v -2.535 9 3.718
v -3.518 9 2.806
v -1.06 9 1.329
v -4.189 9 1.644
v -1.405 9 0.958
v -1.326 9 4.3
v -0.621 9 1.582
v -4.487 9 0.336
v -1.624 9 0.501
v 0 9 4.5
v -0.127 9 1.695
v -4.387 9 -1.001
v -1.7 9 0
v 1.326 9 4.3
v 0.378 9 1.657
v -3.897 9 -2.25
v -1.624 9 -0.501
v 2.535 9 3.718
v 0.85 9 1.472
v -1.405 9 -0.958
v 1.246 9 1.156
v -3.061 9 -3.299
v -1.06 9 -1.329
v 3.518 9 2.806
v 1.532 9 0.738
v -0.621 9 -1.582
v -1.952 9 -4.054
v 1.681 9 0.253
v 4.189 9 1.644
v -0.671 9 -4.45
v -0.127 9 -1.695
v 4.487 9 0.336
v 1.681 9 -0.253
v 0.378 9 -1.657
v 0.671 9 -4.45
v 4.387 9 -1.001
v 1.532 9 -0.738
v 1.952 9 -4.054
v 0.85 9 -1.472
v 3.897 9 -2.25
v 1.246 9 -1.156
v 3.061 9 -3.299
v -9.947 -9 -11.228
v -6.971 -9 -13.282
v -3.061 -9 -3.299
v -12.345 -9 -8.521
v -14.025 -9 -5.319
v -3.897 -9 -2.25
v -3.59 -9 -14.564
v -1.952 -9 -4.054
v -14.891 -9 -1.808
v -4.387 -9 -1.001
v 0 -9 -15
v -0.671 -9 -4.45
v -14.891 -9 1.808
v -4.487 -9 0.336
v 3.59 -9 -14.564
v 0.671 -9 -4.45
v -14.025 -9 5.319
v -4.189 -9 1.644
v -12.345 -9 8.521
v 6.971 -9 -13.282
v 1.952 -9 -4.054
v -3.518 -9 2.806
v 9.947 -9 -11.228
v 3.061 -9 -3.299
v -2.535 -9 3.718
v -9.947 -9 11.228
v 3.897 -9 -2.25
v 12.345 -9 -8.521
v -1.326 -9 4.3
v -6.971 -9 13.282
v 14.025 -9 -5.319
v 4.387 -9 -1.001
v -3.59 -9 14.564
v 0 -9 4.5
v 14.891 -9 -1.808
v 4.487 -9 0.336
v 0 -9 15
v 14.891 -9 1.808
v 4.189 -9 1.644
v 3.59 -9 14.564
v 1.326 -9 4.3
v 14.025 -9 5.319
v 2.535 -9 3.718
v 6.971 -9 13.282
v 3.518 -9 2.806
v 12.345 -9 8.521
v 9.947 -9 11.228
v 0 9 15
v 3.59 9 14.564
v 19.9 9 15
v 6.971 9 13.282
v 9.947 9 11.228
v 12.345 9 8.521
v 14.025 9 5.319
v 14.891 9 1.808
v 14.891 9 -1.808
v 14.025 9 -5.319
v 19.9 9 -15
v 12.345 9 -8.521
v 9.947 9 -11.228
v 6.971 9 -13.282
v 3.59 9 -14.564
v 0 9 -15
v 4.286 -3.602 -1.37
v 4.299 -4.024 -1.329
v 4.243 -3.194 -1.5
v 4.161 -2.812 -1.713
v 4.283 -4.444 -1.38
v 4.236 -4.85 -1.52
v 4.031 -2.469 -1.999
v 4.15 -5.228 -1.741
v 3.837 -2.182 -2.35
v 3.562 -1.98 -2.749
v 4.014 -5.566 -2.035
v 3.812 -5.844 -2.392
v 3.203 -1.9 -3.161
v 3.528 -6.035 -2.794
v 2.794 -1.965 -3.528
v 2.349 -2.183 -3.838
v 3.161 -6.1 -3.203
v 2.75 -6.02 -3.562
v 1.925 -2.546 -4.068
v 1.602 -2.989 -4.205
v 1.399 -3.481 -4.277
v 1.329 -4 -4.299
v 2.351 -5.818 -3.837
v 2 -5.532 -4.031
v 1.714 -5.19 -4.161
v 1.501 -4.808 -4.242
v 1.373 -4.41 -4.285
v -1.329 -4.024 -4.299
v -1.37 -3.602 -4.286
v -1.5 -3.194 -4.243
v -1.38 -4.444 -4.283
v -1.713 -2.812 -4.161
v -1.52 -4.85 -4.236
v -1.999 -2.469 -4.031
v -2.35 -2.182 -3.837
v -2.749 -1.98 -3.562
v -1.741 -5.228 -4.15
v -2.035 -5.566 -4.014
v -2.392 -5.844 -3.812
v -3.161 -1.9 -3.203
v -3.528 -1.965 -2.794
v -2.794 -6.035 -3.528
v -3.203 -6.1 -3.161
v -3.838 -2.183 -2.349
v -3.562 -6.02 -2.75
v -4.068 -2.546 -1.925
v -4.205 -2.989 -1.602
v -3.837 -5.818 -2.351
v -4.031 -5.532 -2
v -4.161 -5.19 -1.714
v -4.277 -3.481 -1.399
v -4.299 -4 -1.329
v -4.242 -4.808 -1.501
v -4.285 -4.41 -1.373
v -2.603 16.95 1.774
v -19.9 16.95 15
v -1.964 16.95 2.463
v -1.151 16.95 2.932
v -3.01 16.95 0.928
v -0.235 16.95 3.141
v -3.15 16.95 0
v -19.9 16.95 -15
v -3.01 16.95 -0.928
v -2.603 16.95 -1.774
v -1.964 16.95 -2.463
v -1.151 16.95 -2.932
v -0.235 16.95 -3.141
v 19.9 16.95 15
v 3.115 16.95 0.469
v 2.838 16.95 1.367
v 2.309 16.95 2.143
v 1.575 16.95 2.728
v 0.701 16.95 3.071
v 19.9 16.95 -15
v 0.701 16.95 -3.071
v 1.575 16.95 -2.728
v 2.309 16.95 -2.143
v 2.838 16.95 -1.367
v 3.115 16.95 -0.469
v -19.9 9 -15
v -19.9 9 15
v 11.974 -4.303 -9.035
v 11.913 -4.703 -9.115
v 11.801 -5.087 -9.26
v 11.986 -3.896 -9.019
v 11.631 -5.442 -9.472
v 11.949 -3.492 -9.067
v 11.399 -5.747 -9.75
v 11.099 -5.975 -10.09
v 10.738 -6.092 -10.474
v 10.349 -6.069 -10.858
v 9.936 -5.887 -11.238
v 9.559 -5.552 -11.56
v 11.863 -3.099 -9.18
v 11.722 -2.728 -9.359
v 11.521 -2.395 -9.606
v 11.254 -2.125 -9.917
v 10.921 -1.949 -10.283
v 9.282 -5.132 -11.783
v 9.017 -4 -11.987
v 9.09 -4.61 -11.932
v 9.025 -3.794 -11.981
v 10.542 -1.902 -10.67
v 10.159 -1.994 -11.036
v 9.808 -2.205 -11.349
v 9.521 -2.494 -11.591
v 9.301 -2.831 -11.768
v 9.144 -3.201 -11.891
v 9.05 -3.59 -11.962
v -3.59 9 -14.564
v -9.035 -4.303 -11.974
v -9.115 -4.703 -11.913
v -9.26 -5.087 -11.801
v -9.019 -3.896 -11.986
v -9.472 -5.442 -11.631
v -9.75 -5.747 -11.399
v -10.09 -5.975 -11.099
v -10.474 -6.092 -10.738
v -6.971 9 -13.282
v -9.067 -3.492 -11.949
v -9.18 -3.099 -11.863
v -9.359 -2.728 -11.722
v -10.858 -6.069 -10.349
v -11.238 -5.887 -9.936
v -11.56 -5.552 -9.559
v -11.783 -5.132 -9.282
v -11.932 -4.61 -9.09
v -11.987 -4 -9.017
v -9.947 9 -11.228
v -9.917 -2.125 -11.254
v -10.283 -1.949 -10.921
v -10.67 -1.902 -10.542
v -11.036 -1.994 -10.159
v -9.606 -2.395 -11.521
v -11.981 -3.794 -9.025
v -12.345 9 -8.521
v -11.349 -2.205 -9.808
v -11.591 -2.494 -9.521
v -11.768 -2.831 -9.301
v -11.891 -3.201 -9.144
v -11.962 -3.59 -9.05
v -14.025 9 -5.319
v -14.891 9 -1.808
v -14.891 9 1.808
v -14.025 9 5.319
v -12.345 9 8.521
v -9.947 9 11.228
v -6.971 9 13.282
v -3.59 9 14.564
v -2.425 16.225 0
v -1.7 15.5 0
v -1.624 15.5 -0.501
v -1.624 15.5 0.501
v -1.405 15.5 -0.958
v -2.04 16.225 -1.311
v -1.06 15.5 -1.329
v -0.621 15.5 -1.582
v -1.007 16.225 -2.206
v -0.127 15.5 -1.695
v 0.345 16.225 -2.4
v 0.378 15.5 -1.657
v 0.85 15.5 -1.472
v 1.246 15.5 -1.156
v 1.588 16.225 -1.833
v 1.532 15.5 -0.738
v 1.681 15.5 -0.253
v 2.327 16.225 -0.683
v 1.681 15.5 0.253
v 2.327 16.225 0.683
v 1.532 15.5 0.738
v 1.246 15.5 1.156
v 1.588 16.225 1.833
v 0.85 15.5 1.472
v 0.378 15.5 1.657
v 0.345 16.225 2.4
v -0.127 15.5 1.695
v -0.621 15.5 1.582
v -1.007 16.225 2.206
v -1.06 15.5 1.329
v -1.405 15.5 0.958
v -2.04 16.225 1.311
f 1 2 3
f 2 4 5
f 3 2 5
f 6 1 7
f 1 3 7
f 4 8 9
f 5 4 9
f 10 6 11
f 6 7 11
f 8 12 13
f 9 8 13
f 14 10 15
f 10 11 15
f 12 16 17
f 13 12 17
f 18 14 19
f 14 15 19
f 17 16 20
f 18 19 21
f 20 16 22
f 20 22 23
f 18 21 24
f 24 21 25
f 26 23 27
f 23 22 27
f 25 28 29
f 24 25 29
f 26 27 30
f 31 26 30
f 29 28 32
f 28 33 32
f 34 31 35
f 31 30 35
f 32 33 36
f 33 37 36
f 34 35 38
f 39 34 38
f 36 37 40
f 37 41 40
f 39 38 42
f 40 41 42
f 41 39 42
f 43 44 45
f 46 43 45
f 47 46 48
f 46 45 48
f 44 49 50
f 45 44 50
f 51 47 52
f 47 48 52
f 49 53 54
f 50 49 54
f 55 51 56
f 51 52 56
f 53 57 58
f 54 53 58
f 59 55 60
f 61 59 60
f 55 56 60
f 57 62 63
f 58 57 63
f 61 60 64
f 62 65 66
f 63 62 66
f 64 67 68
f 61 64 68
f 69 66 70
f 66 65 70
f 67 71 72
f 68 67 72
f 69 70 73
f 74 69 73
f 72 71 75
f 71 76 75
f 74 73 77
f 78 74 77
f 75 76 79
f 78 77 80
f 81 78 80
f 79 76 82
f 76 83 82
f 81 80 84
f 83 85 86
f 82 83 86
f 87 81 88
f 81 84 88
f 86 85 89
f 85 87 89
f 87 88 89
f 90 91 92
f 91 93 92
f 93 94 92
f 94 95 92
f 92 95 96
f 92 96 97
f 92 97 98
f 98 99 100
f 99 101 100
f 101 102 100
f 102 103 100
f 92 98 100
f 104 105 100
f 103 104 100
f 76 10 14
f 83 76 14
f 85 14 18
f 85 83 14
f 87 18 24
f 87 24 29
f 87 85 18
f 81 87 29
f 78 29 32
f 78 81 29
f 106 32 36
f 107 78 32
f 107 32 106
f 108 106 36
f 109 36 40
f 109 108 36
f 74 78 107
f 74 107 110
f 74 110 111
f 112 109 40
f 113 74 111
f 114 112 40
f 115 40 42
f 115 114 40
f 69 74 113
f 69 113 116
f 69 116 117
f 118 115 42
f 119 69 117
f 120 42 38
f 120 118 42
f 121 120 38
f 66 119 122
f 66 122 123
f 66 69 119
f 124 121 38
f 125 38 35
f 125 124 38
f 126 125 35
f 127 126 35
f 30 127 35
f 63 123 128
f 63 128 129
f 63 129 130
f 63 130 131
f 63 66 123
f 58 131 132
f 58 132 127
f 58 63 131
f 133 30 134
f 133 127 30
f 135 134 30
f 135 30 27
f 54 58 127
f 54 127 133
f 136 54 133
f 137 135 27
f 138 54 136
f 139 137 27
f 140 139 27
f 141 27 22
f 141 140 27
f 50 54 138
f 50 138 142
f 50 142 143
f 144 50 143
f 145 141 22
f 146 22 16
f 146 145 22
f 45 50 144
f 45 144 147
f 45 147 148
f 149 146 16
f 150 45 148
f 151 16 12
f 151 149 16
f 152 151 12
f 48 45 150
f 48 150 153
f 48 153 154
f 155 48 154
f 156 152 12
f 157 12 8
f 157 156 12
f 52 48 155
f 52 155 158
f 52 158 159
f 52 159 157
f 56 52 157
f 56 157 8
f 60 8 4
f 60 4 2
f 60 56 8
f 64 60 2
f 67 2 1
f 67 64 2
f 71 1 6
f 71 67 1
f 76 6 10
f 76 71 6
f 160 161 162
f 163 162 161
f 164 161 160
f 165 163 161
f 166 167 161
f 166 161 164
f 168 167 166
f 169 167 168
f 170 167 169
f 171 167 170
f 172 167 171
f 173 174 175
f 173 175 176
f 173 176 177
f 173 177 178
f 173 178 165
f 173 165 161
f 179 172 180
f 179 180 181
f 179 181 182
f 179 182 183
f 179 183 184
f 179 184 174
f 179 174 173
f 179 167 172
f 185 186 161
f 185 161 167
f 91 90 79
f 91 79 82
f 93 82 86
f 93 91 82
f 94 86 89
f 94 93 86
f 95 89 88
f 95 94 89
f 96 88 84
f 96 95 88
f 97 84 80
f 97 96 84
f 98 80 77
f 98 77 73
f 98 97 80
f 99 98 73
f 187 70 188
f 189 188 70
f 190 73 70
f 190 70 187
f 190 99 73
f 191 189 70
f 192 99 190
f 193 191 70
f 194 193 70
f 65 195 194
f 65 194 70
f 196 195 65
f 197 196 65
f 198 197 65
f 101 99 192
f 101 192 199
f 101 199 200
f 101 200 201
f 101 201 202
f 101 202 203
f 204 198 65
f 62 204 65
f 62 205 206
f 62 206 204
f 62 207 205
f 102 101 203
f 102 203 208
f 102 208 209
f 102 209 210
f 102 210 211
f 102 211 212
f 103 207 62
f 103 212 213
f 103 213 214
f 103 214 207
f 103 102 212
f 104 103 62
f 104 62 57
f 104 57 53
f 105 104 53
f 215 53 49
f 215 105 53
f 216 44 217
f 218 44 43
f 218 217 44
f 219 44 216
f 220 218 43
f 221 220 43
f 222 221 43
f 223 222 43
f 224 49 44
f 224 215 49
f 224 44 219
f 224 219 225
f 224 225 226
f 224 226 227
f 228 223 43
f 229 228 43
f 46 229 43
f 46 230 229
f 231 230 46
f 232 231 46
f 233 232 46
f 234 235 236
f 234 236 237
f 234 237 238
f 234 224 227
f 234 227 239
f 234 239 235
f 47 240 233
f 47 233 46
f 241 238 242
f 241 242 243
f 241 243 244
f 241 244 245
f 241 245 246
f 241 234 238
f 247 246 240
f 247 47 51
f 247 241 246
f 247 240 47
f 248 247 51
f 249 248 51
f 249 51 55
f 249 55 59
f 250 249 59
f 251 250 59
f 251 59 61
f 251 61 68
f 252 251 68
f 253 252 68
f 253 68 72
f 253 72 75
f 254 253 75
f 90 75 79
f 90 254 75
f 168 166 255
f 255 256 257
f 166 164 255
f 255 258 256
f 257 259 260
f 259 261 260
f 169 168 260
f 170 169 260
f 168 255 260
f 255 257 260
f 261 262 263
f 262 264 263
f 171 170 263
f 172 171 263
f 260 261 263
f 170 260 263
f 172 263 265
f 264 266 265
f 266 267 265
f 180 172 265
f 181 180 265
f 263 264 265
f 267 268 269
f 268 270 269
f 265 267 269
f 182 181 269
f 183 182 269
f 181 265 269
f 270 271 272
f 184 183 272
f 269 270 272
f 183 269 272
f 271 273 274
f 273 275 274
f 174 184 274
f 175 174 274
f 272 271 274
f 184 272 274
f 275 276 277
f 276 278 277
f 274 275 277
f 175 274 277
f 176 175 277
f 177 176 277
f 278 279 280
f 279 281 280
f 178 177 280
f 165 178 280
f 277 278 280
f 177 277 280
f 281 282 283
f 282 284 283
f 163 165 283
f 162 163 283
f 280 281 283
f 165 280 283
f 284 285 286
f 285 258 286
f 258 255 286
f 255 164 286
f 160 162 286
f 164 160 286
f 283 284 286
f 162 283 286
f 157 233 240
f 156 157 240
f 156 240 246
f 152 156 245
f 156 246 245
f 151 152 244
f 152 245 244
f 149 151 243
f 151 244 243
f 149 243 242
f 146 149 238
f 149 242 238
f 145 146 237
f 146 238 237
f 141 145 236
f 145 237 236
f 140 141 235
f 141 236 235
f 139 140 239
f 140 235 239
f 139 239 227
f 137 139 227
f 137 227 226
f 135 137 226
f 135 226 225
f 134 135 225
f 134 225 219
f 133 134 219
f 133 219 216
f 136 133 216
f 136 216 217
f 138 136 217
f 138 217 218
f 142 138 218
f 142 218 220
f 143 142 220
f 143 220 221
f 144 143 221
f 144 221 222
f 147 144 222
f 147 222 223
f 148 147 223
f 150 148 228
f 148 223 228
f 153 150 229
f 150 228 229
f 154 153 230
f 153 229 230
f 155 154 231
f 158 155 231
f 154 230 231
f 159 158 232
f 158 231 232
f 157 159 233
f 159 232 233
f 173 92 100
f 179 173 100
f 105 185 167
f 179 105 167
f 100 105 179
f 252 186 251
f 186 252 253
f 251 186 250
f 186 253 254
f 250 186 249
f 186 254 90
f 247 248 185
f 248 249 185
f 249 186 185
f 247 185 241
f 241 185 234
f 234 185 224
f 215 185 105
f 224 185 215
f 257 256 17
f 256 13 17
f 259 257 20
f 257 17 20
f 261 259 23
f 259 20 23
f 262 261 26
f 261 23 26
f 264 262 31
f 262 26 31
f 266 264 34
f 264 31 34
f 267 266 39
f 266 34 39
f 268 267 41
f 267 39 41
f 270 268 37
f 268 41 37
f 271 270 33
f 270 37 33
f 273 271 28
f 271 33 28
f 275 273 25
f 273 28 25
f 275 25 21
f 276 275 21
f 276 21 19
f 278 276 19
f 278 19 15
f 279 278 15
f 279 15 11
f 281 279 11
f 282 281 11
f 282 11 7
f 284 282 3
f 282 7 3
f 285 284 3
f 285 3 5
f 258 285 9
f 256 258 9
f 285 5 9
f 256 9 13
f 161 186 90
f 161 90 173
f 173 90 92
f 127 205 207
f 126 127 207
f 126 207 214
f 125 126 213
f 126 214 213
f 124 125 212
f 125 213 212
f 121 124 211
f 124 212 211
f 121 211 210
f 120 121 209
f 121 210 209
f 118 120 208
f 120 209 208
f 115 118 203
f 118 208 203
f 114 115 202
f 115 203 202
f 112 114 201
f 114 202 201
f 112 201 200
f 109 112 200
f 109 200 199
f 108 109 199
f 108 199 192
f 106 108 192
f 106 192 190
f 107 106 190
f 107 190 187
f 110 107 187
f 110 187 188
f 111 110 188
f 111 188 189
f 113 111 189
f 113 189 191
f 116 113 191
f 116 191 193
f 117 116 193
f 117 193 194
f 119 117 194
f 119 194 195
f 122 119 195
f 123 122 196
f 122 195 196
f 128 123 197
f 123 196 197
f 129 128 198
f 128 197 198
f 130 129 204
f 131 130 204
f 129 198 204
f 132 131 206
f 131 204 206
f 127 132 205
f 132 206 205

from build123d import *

# Parameters (mm, degrees)
SKETCH1_R                                           = 15
SKETCH1_R_2                                         = 4.5
BOSS_EXTRUDE1_DEPTH                                 = 9
SKETCH2_W                                           = 39.8
SKETCH2_H                                           = 30
SKETCH2_R                                           = 1.5
BOSS_EXTRUDE2_DEPTH                                 = 7.95
CSK_FOR_M3_COUNTERSUNK_FLAT_HEAD_SCREW1_D           = 3.4
CSK_FOR_M3_COUNTERSUNK_FLAT_HEAD_SCREW1_CSINK_D     = 6.3
CSK_FOR_M3_COUNTERSUNK_FLAT_HEAD_SCREW1_CSINK_ANGLE = 90
M5_TAPPED_HOLE1_REACH                               = 45.286
M5_TAPPED_HOLE1_BORE_R                              = 2.1
M5_TAPPED_HOLE2_REACH                               = 45.286
M5_TAPPED_HOLE2_BORE_R                              = 2.1


with BuildPart() as part:
    # Sketch1 → Boss-Extrude1 (new, symmetric)
    with BuildSketch(Plane(origin=(0, 0, 0), x_dir=(1, 0, 0), z_dir=(0, 1, 0))):
        with Locations(Location((0, 0, 0), (0, 0, 270))):
            Circle(SKETCH1_R)
        with Locations(Location((0, 0, 0), (0, 0, 270))):
            Circle(SKETCH1_R_2, mode=Mode.SUBTRACT)
    extrude(amount=BOSS_EXTRUDE1_DEPTH, both=True)

    # Sketch2 → Boss-Extrude2 (add)
    with BuildSketch(Plane(origin=(0, 9, 0), x_dir=(1, 0, 0), z_dir=(0, 1, 0))):
        Rectangle(SKETCH2_W, SKETCH2_H)
        with Locations(Location((0, 0, 0), (0, 0, 270))):
            Circle(SKETCH2_R, mode=Mode.SUBTRACT)
    extrude(amount=BOSS_EXTRUDE2_DEPTH)

    # CSK for M3 Countersunk Flat Head Screw1 (through all)
    with Locations(Plane(origin=(0, 16.95, 0), x_dir=(1, 0, 0), z_dir=(0, 1, 0))):
        with Locations((0, 0)):
            CounterSinkHole(CSK_FOR_M3_COUNTERSUNK_FLAT_HEAD_SCREW1_D / 2, CSK_FOR_M3_COUNTERSUNK_FLAT_HEAD_SCREW1_CSINK_D / 2, counter_sink_angle=CSK_FOR_M3_COUNTERSUNK_FLAT_HEAD_SCREW1_CSINK_ANGLE)

    # M5 Tapped Hole1 bore → M5 Tapped Hole1 (cut, up to next)
    with BuildSketch(Plane(origin=(10.606601718, 0, -10.606601718), x_dir=(-0.7071067811865476, 0, -0.7071067811865476), z_dir=(0.7071067811865476, 0, -0.7071067811865476)), mode=Mode.PRIVATE) as m5_tapped_hole1_sk1:
        with Locations((0, -4)):
            Circle(M5_TAPPED_HOLE1_BORE_R)
    m5_tapped_hole1_tool1 = extrude(m5_tapped_hole1_sk1.sketch, amount=-M5_TAPPED_HOLE1_REACH, mode=Mode.PRIVATE) & part.part
    add(m5_tapped_hole1_tool1.solids().sort_by_distance((10.606602, -4, -10.606602))[0], mode=Mode.SUBTRACT)

    # M5 Tapped Hole2 bore → M5 Tapped Hole2 (cut, up to next)
    with BuildSketch(Plane(origin=(-10.606601718, 0, -10.606601718), x_dir=(-0.7071067811865476, 0, 0.7071067811865476), z_dir=(-0.7071067811865476, 0, -0.7071067811865476)), mode=Mode.PRIVATE) as m5_tapped_hole2_sk1:
        with Locations((0, -4)):
            Circle(M5_TAPPED_HOLE2_BORE_R)
    m5_tapped_hole2_tool1 = extrude(m5_tapped_hole2_sk1.sketch, amount=-M5_TAPPED_HOLE2_REACH, mode=Mode.PRIVATE) & part.part
    add(m5_tapped_hole2_tool1.solids().sort_by_distance((-10.606602, -4, -10.606602))[0], mode=Mode.SUBTRACT)


solid = part.part
